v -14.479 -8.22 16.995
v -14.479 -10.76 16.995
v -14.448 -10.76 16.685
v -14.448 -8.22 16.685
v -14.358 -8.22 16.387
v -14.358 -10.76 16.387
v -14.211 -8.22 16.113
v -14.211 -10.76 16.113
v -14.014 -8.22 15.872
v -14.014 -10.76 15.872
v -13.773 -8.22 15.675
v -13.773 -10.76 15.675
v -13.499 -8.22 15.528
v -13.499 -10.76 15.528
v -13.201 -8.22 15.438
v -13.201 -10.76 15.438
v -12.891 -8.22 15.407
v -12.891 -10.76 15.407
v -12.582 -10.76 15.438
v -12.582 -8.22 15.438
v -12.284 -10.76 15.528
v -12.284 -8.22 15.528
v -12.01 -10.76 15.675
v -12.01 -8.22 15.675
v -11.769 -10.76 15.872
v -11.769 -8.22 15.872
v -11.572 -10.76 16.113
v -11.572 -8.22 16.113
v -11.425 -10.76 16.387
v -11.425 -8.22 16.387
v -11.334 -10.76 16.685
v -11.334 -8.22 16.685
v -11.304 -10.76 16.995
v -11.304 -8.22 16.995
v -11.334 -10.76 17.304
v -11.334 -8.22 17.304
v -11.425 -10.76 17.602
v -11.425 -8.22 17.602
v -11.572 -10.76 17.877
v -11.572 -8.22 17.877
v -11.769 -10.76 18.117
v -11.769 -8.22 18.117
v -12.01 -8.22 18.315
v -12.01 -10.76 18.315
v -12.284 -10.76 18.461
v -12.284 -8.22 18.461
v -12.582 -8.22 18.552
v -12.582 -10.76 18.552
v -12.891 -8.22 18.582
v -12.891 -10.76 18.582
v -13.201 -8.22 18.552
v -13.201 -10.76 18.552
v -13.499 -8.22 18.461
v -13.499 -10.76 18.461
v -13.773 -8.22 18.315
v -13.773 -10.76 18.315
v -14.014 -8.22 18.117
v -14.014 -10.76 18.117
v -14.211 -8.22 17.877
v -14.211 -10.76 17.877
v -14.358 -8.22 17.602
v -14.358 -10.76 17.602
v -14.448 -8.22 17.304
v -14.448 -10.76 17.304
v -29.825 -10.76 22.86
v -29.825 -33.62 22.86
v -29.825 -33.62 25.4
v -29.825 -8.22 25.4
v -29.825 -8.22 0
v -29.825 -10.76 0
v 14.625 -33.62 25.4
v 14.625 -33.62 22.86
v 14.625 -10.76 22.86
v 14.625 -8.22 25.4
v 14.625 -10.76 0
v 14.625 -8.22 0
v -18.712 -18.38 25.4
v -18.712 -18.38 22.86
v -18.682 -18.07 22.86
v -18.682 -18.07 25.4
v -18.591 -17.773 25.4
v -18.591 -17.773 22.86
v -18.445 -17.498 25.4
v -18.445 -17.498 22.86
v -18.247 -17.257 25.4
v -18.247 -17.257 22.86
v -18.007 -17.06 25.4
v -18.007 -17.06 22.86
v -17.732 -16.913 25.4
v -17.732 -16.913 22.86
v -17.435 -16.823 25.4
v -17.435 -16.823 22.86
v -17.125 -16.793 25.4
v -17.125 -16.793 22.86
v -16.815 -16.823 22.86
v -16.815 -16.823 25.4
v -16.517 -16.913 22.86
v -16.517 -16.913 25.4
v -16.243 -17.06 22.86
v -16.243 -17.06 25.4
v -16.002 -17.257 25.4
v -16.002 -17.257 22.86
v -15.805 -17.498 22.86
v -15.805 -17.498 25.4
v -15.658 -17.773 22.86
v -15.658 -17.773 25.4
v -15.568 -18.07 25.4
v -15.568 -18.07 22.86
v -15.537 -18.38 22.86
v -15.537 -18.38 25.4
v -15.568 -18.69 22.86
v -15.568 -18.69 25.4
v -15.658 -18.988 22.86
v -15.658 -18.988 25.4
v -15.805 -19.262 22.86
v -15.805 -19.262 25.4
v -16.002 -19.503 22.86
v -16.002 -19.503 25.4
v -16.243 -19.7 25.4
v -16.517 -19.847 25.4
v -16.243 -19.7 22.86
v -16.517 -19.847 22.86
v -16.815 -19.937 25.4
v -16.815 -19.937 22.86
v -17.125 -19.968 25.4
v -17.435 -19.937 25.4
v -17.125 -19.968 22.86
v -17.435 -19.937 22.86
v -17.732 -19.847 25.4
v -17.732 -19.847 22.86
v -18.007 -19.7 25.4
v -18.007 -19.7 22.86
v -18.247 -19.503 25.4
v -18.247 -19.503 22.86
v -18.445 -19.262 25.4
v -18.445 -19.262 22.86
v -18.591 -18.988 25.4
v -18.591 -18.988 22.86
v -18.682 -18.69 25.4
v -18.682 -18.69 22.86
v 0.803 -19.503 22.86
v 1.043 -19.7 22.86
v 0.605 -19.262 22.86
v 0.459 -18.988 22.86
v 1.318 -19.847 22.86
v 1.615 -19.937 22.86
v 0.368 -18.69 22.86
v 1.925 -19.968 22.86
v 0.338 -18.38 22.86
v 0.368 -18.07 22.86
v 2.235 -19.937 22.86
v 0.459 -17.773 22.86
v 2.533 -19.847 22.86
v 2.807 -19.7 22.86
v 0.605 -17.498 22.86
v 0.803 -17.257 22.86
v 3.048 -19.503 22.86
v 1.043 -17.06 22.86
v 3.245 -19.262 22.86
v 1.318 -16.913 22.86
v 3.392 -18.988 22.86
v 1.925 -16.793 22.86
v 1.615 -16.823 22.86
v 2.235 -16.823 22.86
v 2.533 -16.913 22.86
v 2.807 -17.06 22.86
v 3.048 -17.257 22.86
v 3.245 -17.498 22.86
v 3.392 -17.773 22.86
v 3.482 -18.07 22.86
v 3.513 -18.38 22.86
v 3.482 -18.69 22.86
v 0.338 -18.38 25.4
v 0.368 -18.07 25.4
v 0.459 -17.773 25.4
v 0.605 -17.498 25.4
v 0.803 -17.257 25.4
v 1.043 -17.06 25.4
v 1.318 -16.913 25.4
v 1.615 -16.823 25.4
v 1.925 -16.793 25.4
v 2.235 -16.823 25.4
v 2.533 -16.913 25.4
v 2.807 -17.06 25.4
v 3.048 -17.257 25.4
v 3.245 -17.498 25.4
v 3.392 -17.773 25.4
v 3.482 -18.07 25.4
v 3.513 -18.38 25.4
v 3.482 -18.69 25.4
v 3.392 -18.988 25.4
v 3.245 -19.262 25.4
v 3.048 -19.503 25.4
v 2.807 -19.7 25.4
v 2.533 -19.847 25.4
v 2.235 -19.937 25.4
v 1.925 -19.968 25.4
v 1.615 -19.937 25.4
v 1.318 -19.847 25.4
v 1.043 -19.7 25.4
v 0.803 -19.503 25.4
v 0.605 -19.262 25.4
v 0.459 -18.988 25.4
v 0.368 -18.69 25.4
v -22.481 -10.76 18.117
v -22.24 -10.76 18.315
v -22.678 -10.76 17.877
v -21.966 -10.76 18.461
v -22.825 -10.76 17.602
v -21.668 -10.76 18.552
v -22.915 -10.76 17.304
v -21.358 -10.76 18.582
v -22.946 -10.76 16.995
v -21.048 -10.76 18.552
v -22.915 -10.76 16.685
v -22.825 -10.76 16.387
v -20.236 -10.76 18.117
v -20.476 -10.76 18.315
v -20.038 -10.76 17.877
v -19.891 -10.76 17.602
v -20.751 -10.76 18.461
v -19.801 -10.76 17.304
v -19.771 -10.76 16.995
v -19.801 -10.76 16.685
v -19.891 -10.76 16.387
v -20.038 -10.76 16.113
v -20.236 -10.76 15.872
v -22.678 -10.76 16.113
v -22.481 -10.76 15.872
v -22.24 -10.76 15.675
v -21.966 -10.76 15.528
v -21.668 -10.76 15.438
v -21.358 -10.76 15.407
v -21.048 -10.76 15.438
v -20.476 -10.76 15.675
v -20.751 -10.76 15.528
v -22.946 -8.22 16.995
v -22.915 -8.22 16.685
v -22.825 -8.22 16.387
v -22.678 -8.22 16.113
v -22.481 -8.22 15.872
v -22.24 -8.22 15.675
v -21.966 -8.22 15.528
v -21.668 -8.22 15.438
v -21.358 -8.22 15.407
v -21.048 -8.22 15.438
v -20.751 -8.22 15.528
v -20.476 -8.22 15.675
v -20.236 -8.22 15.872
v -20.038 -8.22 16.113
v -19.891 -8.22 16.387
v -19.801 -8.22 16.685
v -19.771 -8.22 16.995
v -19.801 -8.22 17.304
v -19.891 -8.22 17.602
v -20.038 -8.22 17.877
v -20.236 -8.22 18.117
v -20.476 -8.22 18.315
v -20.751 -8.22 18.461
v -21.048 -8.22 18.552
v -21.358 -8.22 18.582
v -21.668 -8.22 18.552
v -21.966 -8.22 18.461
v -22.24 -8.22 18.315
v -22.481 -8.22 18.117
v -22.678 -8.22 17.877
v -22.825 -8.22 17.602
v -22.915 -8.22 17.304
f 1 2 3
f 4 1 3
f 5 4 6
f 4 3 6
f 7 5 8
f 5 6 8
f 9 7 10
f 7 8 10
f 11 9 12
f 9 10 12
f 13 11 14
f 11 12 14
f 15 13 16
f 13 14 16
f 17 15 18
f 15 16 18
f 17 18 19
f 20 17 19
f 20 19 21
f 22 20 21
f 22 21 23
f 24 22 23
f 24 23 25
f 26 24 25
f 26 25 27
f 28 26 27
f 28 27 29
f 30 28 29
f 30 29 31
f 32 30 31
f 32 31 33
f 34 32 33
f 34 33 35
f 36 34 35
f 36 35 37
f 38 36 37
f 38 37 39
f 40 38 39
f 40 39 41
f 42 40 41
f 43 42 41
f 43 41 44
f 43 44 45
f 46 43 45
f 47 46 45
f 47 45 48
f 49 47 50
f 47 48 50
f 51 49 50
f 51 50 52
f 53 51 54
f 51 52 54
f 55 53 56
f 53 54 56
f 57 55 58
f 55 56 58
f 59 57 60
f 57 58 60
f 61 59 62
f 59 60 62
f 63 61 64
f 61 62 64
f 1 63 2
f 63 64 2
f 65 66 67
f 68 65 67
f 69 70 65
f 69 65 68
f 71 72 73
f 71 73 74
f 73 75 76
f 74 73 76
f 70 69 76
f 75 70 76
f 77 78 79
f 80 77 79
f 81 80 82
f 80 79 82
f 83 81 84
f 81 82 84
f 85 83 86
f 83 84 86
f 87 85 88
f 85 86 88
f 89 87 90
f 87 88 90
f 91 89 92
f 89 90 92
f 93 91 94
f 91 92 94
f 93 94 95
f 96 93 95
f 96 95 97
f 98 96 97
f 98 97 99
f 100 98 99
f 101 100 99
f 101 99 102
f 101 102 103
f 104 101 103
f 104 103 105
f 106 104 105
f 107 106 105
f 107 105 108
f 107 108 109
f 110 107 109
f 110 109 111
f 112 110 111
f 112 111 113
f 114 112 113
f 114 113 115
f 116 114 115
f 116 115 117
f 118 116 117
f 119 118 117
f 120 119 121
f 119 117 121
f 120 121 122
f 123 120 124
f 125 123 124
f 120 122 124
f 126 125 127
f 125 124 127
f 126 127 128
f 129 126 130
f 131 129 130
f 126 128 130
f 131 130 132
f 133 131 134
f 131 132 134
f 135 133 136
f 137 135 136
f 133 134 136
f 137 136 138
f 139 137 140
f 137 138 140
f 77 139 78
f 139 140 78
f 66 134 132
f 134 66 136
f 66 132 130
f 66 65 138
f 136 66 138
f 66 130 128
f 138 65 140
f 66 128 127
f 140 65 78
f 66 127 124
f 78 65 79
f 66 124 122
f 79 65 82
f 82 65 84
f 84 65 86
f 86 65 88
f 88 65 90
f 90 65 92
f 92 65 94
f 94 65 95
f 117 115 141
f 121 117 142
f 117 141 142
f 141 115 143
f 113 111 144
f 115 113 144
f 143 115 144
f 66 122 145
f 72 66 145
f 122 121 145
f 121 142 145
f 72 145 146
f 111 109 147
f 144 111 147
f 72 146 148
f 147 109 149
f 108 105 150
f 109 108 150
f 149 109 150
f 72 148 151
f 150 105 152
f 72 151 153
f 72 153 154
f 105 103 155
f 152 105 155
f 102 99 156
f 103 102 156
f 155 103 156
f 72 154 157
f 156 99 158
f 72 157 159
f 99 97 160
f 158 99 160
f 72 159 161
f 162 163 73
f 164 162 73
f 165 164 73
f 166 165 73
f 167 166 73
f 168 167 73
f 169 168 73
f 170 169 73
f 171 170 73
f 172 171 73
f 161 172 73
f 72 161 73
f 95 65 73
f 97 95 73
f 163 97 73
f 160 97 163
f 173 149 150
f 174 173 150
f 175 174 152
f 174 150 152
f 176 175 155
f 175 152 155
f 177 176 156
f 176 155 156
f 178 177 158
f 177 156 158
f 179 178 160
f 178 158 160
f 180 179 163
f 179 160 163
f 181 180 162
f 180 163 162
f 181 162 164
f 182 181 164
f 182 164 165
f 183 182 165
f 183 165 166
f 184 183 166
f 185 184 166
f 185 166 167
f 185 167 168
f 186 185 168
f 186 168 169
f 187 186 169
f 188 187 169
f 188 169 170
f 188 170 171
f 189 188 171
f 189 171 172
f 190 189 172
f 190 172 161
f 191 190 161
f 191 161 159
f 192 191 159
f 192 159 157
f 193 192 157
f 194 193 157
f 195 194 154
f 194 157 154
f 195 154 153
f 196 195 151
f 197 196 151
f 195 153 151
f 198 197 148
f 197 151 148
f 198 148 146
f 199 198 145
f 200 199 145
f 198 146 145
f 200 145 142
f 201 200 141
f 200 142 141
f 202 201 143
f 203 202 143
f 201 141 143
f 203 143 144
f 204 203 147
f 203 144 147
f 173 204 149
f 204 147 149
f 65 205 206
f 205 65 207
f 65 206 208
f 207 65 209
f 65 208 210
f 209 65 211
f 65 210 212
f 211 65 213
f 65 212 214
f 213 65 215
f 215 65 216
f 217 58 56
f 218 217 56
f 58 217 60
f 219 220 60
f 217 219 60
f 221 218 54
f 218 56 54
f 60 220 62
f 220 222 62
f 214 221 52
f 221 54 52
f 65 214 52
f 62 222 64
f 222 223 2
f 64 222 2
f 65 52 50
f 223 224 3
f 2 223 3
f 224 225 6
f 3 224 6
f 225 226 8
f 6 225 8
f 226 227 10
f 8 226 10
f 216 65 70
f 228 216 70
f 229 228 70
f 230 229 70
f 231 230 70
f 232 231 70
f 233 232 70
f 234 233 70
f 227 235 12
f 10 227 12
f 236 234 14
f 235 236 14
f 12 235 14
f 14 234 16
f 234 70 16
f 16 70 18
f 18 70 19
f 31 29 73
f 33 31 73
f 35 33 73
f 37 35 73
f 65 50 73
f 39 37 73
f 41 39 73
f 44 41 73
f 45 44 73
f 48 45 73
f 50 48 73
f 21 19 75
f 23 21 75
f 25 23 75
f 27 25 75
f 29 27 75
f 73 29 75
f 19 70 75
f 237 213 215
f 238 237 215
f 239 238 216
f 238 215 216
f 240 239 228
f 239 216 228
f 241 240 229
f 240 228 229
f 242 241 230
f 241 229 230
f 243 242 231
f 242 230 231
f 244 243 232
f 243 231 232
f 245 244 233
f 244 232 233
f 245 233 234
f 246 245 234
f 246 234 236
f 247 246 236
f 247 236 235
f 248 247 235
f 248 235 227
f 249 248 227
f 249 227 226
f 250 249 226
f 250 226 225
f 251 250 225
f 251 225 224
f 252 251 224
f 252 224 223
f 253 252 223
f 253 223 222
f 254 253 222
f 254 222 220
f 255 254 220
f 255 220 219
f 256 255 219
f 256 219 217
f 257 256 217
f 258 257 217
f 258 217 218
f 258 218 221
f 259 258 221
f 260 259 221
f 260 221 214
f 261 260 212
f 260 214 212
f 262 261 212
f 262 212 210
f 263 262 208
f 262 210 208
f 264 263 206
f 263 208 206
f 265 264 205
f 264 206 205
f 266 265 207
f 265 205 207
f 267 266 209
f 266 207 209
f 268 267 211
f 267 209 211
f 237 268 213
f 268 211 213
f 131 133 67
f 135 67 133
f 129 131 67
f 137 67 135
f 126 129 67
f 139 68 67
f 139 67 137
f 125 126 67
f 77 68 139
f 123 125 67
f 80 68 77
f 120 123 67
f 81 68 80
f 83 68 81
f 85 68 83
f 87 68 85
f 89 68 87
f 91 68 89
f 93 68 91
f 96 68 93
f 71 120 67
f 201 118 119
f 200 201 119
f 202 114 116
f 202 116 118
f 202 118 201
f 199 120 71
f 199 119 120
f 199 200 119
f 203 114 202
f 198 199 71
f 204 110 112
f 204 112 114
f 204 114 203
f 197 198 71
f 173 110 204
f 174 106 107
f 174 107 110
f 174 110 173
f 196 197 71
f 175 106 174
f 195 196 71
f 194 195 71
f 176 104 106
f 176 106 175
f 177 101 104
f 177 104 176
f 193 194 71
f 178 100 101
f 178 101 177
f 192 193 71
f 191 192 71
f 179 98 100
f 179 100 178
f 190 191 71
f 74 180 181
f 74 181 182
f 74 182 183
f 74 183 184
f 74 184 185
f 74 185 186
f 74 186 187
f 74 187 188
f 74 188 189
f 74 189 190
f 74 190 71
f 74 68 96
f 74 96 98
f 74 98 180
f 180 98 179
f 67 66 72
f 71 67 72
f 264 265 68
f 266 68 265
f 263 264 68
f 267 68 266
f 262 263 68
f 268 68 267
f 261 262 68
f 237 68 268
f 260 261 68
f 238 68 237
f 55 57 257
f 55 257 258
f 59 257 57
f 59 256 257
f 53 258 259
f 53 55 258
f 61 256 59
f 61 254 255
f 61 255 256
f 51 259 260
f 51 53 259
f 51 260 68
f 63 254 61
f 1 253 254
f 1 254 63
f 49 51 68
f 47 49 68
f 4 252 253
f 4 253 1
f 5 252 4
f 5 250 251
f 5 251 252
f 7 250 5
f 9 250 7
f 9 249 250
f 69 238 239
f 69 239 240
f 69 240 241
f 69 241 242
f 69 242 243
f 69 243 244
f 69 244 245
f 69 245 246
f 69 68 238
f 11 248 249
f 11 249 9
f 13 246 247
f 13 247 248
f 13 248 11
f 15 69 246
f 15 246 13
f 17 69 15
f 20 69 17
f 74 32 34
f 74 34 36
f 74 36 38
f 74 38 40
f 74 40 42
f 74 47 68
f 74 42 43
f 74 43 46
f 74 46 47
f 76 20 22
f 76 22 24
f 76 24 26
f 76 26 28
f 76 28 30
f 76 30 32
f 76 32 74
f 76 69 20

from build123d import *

# Parameters (mm, degrees)
F0_W     = 44.45
F0_H     = 25.4
F1_DEPTH = 25.4
F2_T     = -2.54
F4_D     = 3.175
F6_D     = 3.175


with BuildPart() as f1:
    # F0 (on Top) → F1 (new body)
    with BuildSketch(Plane.XY):
        with Locations((-7.5998026878, -20.9200205722)):
            Rectangle(F0_W, F0_H)
    extrude(amount=F1_DEPTH)

    # F2
    f2_openings = [f1.faces().sort_by_distance(p)[0] for p in [
        (14.625197, -20.920021, 12.7),
        (-29.824803, -20.920021, 12.7),
        (-7.599803, -33.620021, 12.7),
        (-7.599803, -20.920021, 0),
    ]]
    offset(amount=F2_T, openings=f2_openings)

    # F4 (through all)
    with Locations(Plane(origin=(0, 0, 0), x_dir=(1, 0, 0), z_dir=(0, 1, 0))):
        with Locations((-12.8914693544, -16.9946048409), (-21.3581360211, -16.9946048409)):
            Hole(F4_D / 2)

    # F6 (through all)
    with Locations(Plane.XY.offset(25.4)):
        with Locations((-17.1248026878, -18.3800205722), (1.9251973122, -18.3800205722)):
            Hole(F6_D / 2)


solid = f1.part
